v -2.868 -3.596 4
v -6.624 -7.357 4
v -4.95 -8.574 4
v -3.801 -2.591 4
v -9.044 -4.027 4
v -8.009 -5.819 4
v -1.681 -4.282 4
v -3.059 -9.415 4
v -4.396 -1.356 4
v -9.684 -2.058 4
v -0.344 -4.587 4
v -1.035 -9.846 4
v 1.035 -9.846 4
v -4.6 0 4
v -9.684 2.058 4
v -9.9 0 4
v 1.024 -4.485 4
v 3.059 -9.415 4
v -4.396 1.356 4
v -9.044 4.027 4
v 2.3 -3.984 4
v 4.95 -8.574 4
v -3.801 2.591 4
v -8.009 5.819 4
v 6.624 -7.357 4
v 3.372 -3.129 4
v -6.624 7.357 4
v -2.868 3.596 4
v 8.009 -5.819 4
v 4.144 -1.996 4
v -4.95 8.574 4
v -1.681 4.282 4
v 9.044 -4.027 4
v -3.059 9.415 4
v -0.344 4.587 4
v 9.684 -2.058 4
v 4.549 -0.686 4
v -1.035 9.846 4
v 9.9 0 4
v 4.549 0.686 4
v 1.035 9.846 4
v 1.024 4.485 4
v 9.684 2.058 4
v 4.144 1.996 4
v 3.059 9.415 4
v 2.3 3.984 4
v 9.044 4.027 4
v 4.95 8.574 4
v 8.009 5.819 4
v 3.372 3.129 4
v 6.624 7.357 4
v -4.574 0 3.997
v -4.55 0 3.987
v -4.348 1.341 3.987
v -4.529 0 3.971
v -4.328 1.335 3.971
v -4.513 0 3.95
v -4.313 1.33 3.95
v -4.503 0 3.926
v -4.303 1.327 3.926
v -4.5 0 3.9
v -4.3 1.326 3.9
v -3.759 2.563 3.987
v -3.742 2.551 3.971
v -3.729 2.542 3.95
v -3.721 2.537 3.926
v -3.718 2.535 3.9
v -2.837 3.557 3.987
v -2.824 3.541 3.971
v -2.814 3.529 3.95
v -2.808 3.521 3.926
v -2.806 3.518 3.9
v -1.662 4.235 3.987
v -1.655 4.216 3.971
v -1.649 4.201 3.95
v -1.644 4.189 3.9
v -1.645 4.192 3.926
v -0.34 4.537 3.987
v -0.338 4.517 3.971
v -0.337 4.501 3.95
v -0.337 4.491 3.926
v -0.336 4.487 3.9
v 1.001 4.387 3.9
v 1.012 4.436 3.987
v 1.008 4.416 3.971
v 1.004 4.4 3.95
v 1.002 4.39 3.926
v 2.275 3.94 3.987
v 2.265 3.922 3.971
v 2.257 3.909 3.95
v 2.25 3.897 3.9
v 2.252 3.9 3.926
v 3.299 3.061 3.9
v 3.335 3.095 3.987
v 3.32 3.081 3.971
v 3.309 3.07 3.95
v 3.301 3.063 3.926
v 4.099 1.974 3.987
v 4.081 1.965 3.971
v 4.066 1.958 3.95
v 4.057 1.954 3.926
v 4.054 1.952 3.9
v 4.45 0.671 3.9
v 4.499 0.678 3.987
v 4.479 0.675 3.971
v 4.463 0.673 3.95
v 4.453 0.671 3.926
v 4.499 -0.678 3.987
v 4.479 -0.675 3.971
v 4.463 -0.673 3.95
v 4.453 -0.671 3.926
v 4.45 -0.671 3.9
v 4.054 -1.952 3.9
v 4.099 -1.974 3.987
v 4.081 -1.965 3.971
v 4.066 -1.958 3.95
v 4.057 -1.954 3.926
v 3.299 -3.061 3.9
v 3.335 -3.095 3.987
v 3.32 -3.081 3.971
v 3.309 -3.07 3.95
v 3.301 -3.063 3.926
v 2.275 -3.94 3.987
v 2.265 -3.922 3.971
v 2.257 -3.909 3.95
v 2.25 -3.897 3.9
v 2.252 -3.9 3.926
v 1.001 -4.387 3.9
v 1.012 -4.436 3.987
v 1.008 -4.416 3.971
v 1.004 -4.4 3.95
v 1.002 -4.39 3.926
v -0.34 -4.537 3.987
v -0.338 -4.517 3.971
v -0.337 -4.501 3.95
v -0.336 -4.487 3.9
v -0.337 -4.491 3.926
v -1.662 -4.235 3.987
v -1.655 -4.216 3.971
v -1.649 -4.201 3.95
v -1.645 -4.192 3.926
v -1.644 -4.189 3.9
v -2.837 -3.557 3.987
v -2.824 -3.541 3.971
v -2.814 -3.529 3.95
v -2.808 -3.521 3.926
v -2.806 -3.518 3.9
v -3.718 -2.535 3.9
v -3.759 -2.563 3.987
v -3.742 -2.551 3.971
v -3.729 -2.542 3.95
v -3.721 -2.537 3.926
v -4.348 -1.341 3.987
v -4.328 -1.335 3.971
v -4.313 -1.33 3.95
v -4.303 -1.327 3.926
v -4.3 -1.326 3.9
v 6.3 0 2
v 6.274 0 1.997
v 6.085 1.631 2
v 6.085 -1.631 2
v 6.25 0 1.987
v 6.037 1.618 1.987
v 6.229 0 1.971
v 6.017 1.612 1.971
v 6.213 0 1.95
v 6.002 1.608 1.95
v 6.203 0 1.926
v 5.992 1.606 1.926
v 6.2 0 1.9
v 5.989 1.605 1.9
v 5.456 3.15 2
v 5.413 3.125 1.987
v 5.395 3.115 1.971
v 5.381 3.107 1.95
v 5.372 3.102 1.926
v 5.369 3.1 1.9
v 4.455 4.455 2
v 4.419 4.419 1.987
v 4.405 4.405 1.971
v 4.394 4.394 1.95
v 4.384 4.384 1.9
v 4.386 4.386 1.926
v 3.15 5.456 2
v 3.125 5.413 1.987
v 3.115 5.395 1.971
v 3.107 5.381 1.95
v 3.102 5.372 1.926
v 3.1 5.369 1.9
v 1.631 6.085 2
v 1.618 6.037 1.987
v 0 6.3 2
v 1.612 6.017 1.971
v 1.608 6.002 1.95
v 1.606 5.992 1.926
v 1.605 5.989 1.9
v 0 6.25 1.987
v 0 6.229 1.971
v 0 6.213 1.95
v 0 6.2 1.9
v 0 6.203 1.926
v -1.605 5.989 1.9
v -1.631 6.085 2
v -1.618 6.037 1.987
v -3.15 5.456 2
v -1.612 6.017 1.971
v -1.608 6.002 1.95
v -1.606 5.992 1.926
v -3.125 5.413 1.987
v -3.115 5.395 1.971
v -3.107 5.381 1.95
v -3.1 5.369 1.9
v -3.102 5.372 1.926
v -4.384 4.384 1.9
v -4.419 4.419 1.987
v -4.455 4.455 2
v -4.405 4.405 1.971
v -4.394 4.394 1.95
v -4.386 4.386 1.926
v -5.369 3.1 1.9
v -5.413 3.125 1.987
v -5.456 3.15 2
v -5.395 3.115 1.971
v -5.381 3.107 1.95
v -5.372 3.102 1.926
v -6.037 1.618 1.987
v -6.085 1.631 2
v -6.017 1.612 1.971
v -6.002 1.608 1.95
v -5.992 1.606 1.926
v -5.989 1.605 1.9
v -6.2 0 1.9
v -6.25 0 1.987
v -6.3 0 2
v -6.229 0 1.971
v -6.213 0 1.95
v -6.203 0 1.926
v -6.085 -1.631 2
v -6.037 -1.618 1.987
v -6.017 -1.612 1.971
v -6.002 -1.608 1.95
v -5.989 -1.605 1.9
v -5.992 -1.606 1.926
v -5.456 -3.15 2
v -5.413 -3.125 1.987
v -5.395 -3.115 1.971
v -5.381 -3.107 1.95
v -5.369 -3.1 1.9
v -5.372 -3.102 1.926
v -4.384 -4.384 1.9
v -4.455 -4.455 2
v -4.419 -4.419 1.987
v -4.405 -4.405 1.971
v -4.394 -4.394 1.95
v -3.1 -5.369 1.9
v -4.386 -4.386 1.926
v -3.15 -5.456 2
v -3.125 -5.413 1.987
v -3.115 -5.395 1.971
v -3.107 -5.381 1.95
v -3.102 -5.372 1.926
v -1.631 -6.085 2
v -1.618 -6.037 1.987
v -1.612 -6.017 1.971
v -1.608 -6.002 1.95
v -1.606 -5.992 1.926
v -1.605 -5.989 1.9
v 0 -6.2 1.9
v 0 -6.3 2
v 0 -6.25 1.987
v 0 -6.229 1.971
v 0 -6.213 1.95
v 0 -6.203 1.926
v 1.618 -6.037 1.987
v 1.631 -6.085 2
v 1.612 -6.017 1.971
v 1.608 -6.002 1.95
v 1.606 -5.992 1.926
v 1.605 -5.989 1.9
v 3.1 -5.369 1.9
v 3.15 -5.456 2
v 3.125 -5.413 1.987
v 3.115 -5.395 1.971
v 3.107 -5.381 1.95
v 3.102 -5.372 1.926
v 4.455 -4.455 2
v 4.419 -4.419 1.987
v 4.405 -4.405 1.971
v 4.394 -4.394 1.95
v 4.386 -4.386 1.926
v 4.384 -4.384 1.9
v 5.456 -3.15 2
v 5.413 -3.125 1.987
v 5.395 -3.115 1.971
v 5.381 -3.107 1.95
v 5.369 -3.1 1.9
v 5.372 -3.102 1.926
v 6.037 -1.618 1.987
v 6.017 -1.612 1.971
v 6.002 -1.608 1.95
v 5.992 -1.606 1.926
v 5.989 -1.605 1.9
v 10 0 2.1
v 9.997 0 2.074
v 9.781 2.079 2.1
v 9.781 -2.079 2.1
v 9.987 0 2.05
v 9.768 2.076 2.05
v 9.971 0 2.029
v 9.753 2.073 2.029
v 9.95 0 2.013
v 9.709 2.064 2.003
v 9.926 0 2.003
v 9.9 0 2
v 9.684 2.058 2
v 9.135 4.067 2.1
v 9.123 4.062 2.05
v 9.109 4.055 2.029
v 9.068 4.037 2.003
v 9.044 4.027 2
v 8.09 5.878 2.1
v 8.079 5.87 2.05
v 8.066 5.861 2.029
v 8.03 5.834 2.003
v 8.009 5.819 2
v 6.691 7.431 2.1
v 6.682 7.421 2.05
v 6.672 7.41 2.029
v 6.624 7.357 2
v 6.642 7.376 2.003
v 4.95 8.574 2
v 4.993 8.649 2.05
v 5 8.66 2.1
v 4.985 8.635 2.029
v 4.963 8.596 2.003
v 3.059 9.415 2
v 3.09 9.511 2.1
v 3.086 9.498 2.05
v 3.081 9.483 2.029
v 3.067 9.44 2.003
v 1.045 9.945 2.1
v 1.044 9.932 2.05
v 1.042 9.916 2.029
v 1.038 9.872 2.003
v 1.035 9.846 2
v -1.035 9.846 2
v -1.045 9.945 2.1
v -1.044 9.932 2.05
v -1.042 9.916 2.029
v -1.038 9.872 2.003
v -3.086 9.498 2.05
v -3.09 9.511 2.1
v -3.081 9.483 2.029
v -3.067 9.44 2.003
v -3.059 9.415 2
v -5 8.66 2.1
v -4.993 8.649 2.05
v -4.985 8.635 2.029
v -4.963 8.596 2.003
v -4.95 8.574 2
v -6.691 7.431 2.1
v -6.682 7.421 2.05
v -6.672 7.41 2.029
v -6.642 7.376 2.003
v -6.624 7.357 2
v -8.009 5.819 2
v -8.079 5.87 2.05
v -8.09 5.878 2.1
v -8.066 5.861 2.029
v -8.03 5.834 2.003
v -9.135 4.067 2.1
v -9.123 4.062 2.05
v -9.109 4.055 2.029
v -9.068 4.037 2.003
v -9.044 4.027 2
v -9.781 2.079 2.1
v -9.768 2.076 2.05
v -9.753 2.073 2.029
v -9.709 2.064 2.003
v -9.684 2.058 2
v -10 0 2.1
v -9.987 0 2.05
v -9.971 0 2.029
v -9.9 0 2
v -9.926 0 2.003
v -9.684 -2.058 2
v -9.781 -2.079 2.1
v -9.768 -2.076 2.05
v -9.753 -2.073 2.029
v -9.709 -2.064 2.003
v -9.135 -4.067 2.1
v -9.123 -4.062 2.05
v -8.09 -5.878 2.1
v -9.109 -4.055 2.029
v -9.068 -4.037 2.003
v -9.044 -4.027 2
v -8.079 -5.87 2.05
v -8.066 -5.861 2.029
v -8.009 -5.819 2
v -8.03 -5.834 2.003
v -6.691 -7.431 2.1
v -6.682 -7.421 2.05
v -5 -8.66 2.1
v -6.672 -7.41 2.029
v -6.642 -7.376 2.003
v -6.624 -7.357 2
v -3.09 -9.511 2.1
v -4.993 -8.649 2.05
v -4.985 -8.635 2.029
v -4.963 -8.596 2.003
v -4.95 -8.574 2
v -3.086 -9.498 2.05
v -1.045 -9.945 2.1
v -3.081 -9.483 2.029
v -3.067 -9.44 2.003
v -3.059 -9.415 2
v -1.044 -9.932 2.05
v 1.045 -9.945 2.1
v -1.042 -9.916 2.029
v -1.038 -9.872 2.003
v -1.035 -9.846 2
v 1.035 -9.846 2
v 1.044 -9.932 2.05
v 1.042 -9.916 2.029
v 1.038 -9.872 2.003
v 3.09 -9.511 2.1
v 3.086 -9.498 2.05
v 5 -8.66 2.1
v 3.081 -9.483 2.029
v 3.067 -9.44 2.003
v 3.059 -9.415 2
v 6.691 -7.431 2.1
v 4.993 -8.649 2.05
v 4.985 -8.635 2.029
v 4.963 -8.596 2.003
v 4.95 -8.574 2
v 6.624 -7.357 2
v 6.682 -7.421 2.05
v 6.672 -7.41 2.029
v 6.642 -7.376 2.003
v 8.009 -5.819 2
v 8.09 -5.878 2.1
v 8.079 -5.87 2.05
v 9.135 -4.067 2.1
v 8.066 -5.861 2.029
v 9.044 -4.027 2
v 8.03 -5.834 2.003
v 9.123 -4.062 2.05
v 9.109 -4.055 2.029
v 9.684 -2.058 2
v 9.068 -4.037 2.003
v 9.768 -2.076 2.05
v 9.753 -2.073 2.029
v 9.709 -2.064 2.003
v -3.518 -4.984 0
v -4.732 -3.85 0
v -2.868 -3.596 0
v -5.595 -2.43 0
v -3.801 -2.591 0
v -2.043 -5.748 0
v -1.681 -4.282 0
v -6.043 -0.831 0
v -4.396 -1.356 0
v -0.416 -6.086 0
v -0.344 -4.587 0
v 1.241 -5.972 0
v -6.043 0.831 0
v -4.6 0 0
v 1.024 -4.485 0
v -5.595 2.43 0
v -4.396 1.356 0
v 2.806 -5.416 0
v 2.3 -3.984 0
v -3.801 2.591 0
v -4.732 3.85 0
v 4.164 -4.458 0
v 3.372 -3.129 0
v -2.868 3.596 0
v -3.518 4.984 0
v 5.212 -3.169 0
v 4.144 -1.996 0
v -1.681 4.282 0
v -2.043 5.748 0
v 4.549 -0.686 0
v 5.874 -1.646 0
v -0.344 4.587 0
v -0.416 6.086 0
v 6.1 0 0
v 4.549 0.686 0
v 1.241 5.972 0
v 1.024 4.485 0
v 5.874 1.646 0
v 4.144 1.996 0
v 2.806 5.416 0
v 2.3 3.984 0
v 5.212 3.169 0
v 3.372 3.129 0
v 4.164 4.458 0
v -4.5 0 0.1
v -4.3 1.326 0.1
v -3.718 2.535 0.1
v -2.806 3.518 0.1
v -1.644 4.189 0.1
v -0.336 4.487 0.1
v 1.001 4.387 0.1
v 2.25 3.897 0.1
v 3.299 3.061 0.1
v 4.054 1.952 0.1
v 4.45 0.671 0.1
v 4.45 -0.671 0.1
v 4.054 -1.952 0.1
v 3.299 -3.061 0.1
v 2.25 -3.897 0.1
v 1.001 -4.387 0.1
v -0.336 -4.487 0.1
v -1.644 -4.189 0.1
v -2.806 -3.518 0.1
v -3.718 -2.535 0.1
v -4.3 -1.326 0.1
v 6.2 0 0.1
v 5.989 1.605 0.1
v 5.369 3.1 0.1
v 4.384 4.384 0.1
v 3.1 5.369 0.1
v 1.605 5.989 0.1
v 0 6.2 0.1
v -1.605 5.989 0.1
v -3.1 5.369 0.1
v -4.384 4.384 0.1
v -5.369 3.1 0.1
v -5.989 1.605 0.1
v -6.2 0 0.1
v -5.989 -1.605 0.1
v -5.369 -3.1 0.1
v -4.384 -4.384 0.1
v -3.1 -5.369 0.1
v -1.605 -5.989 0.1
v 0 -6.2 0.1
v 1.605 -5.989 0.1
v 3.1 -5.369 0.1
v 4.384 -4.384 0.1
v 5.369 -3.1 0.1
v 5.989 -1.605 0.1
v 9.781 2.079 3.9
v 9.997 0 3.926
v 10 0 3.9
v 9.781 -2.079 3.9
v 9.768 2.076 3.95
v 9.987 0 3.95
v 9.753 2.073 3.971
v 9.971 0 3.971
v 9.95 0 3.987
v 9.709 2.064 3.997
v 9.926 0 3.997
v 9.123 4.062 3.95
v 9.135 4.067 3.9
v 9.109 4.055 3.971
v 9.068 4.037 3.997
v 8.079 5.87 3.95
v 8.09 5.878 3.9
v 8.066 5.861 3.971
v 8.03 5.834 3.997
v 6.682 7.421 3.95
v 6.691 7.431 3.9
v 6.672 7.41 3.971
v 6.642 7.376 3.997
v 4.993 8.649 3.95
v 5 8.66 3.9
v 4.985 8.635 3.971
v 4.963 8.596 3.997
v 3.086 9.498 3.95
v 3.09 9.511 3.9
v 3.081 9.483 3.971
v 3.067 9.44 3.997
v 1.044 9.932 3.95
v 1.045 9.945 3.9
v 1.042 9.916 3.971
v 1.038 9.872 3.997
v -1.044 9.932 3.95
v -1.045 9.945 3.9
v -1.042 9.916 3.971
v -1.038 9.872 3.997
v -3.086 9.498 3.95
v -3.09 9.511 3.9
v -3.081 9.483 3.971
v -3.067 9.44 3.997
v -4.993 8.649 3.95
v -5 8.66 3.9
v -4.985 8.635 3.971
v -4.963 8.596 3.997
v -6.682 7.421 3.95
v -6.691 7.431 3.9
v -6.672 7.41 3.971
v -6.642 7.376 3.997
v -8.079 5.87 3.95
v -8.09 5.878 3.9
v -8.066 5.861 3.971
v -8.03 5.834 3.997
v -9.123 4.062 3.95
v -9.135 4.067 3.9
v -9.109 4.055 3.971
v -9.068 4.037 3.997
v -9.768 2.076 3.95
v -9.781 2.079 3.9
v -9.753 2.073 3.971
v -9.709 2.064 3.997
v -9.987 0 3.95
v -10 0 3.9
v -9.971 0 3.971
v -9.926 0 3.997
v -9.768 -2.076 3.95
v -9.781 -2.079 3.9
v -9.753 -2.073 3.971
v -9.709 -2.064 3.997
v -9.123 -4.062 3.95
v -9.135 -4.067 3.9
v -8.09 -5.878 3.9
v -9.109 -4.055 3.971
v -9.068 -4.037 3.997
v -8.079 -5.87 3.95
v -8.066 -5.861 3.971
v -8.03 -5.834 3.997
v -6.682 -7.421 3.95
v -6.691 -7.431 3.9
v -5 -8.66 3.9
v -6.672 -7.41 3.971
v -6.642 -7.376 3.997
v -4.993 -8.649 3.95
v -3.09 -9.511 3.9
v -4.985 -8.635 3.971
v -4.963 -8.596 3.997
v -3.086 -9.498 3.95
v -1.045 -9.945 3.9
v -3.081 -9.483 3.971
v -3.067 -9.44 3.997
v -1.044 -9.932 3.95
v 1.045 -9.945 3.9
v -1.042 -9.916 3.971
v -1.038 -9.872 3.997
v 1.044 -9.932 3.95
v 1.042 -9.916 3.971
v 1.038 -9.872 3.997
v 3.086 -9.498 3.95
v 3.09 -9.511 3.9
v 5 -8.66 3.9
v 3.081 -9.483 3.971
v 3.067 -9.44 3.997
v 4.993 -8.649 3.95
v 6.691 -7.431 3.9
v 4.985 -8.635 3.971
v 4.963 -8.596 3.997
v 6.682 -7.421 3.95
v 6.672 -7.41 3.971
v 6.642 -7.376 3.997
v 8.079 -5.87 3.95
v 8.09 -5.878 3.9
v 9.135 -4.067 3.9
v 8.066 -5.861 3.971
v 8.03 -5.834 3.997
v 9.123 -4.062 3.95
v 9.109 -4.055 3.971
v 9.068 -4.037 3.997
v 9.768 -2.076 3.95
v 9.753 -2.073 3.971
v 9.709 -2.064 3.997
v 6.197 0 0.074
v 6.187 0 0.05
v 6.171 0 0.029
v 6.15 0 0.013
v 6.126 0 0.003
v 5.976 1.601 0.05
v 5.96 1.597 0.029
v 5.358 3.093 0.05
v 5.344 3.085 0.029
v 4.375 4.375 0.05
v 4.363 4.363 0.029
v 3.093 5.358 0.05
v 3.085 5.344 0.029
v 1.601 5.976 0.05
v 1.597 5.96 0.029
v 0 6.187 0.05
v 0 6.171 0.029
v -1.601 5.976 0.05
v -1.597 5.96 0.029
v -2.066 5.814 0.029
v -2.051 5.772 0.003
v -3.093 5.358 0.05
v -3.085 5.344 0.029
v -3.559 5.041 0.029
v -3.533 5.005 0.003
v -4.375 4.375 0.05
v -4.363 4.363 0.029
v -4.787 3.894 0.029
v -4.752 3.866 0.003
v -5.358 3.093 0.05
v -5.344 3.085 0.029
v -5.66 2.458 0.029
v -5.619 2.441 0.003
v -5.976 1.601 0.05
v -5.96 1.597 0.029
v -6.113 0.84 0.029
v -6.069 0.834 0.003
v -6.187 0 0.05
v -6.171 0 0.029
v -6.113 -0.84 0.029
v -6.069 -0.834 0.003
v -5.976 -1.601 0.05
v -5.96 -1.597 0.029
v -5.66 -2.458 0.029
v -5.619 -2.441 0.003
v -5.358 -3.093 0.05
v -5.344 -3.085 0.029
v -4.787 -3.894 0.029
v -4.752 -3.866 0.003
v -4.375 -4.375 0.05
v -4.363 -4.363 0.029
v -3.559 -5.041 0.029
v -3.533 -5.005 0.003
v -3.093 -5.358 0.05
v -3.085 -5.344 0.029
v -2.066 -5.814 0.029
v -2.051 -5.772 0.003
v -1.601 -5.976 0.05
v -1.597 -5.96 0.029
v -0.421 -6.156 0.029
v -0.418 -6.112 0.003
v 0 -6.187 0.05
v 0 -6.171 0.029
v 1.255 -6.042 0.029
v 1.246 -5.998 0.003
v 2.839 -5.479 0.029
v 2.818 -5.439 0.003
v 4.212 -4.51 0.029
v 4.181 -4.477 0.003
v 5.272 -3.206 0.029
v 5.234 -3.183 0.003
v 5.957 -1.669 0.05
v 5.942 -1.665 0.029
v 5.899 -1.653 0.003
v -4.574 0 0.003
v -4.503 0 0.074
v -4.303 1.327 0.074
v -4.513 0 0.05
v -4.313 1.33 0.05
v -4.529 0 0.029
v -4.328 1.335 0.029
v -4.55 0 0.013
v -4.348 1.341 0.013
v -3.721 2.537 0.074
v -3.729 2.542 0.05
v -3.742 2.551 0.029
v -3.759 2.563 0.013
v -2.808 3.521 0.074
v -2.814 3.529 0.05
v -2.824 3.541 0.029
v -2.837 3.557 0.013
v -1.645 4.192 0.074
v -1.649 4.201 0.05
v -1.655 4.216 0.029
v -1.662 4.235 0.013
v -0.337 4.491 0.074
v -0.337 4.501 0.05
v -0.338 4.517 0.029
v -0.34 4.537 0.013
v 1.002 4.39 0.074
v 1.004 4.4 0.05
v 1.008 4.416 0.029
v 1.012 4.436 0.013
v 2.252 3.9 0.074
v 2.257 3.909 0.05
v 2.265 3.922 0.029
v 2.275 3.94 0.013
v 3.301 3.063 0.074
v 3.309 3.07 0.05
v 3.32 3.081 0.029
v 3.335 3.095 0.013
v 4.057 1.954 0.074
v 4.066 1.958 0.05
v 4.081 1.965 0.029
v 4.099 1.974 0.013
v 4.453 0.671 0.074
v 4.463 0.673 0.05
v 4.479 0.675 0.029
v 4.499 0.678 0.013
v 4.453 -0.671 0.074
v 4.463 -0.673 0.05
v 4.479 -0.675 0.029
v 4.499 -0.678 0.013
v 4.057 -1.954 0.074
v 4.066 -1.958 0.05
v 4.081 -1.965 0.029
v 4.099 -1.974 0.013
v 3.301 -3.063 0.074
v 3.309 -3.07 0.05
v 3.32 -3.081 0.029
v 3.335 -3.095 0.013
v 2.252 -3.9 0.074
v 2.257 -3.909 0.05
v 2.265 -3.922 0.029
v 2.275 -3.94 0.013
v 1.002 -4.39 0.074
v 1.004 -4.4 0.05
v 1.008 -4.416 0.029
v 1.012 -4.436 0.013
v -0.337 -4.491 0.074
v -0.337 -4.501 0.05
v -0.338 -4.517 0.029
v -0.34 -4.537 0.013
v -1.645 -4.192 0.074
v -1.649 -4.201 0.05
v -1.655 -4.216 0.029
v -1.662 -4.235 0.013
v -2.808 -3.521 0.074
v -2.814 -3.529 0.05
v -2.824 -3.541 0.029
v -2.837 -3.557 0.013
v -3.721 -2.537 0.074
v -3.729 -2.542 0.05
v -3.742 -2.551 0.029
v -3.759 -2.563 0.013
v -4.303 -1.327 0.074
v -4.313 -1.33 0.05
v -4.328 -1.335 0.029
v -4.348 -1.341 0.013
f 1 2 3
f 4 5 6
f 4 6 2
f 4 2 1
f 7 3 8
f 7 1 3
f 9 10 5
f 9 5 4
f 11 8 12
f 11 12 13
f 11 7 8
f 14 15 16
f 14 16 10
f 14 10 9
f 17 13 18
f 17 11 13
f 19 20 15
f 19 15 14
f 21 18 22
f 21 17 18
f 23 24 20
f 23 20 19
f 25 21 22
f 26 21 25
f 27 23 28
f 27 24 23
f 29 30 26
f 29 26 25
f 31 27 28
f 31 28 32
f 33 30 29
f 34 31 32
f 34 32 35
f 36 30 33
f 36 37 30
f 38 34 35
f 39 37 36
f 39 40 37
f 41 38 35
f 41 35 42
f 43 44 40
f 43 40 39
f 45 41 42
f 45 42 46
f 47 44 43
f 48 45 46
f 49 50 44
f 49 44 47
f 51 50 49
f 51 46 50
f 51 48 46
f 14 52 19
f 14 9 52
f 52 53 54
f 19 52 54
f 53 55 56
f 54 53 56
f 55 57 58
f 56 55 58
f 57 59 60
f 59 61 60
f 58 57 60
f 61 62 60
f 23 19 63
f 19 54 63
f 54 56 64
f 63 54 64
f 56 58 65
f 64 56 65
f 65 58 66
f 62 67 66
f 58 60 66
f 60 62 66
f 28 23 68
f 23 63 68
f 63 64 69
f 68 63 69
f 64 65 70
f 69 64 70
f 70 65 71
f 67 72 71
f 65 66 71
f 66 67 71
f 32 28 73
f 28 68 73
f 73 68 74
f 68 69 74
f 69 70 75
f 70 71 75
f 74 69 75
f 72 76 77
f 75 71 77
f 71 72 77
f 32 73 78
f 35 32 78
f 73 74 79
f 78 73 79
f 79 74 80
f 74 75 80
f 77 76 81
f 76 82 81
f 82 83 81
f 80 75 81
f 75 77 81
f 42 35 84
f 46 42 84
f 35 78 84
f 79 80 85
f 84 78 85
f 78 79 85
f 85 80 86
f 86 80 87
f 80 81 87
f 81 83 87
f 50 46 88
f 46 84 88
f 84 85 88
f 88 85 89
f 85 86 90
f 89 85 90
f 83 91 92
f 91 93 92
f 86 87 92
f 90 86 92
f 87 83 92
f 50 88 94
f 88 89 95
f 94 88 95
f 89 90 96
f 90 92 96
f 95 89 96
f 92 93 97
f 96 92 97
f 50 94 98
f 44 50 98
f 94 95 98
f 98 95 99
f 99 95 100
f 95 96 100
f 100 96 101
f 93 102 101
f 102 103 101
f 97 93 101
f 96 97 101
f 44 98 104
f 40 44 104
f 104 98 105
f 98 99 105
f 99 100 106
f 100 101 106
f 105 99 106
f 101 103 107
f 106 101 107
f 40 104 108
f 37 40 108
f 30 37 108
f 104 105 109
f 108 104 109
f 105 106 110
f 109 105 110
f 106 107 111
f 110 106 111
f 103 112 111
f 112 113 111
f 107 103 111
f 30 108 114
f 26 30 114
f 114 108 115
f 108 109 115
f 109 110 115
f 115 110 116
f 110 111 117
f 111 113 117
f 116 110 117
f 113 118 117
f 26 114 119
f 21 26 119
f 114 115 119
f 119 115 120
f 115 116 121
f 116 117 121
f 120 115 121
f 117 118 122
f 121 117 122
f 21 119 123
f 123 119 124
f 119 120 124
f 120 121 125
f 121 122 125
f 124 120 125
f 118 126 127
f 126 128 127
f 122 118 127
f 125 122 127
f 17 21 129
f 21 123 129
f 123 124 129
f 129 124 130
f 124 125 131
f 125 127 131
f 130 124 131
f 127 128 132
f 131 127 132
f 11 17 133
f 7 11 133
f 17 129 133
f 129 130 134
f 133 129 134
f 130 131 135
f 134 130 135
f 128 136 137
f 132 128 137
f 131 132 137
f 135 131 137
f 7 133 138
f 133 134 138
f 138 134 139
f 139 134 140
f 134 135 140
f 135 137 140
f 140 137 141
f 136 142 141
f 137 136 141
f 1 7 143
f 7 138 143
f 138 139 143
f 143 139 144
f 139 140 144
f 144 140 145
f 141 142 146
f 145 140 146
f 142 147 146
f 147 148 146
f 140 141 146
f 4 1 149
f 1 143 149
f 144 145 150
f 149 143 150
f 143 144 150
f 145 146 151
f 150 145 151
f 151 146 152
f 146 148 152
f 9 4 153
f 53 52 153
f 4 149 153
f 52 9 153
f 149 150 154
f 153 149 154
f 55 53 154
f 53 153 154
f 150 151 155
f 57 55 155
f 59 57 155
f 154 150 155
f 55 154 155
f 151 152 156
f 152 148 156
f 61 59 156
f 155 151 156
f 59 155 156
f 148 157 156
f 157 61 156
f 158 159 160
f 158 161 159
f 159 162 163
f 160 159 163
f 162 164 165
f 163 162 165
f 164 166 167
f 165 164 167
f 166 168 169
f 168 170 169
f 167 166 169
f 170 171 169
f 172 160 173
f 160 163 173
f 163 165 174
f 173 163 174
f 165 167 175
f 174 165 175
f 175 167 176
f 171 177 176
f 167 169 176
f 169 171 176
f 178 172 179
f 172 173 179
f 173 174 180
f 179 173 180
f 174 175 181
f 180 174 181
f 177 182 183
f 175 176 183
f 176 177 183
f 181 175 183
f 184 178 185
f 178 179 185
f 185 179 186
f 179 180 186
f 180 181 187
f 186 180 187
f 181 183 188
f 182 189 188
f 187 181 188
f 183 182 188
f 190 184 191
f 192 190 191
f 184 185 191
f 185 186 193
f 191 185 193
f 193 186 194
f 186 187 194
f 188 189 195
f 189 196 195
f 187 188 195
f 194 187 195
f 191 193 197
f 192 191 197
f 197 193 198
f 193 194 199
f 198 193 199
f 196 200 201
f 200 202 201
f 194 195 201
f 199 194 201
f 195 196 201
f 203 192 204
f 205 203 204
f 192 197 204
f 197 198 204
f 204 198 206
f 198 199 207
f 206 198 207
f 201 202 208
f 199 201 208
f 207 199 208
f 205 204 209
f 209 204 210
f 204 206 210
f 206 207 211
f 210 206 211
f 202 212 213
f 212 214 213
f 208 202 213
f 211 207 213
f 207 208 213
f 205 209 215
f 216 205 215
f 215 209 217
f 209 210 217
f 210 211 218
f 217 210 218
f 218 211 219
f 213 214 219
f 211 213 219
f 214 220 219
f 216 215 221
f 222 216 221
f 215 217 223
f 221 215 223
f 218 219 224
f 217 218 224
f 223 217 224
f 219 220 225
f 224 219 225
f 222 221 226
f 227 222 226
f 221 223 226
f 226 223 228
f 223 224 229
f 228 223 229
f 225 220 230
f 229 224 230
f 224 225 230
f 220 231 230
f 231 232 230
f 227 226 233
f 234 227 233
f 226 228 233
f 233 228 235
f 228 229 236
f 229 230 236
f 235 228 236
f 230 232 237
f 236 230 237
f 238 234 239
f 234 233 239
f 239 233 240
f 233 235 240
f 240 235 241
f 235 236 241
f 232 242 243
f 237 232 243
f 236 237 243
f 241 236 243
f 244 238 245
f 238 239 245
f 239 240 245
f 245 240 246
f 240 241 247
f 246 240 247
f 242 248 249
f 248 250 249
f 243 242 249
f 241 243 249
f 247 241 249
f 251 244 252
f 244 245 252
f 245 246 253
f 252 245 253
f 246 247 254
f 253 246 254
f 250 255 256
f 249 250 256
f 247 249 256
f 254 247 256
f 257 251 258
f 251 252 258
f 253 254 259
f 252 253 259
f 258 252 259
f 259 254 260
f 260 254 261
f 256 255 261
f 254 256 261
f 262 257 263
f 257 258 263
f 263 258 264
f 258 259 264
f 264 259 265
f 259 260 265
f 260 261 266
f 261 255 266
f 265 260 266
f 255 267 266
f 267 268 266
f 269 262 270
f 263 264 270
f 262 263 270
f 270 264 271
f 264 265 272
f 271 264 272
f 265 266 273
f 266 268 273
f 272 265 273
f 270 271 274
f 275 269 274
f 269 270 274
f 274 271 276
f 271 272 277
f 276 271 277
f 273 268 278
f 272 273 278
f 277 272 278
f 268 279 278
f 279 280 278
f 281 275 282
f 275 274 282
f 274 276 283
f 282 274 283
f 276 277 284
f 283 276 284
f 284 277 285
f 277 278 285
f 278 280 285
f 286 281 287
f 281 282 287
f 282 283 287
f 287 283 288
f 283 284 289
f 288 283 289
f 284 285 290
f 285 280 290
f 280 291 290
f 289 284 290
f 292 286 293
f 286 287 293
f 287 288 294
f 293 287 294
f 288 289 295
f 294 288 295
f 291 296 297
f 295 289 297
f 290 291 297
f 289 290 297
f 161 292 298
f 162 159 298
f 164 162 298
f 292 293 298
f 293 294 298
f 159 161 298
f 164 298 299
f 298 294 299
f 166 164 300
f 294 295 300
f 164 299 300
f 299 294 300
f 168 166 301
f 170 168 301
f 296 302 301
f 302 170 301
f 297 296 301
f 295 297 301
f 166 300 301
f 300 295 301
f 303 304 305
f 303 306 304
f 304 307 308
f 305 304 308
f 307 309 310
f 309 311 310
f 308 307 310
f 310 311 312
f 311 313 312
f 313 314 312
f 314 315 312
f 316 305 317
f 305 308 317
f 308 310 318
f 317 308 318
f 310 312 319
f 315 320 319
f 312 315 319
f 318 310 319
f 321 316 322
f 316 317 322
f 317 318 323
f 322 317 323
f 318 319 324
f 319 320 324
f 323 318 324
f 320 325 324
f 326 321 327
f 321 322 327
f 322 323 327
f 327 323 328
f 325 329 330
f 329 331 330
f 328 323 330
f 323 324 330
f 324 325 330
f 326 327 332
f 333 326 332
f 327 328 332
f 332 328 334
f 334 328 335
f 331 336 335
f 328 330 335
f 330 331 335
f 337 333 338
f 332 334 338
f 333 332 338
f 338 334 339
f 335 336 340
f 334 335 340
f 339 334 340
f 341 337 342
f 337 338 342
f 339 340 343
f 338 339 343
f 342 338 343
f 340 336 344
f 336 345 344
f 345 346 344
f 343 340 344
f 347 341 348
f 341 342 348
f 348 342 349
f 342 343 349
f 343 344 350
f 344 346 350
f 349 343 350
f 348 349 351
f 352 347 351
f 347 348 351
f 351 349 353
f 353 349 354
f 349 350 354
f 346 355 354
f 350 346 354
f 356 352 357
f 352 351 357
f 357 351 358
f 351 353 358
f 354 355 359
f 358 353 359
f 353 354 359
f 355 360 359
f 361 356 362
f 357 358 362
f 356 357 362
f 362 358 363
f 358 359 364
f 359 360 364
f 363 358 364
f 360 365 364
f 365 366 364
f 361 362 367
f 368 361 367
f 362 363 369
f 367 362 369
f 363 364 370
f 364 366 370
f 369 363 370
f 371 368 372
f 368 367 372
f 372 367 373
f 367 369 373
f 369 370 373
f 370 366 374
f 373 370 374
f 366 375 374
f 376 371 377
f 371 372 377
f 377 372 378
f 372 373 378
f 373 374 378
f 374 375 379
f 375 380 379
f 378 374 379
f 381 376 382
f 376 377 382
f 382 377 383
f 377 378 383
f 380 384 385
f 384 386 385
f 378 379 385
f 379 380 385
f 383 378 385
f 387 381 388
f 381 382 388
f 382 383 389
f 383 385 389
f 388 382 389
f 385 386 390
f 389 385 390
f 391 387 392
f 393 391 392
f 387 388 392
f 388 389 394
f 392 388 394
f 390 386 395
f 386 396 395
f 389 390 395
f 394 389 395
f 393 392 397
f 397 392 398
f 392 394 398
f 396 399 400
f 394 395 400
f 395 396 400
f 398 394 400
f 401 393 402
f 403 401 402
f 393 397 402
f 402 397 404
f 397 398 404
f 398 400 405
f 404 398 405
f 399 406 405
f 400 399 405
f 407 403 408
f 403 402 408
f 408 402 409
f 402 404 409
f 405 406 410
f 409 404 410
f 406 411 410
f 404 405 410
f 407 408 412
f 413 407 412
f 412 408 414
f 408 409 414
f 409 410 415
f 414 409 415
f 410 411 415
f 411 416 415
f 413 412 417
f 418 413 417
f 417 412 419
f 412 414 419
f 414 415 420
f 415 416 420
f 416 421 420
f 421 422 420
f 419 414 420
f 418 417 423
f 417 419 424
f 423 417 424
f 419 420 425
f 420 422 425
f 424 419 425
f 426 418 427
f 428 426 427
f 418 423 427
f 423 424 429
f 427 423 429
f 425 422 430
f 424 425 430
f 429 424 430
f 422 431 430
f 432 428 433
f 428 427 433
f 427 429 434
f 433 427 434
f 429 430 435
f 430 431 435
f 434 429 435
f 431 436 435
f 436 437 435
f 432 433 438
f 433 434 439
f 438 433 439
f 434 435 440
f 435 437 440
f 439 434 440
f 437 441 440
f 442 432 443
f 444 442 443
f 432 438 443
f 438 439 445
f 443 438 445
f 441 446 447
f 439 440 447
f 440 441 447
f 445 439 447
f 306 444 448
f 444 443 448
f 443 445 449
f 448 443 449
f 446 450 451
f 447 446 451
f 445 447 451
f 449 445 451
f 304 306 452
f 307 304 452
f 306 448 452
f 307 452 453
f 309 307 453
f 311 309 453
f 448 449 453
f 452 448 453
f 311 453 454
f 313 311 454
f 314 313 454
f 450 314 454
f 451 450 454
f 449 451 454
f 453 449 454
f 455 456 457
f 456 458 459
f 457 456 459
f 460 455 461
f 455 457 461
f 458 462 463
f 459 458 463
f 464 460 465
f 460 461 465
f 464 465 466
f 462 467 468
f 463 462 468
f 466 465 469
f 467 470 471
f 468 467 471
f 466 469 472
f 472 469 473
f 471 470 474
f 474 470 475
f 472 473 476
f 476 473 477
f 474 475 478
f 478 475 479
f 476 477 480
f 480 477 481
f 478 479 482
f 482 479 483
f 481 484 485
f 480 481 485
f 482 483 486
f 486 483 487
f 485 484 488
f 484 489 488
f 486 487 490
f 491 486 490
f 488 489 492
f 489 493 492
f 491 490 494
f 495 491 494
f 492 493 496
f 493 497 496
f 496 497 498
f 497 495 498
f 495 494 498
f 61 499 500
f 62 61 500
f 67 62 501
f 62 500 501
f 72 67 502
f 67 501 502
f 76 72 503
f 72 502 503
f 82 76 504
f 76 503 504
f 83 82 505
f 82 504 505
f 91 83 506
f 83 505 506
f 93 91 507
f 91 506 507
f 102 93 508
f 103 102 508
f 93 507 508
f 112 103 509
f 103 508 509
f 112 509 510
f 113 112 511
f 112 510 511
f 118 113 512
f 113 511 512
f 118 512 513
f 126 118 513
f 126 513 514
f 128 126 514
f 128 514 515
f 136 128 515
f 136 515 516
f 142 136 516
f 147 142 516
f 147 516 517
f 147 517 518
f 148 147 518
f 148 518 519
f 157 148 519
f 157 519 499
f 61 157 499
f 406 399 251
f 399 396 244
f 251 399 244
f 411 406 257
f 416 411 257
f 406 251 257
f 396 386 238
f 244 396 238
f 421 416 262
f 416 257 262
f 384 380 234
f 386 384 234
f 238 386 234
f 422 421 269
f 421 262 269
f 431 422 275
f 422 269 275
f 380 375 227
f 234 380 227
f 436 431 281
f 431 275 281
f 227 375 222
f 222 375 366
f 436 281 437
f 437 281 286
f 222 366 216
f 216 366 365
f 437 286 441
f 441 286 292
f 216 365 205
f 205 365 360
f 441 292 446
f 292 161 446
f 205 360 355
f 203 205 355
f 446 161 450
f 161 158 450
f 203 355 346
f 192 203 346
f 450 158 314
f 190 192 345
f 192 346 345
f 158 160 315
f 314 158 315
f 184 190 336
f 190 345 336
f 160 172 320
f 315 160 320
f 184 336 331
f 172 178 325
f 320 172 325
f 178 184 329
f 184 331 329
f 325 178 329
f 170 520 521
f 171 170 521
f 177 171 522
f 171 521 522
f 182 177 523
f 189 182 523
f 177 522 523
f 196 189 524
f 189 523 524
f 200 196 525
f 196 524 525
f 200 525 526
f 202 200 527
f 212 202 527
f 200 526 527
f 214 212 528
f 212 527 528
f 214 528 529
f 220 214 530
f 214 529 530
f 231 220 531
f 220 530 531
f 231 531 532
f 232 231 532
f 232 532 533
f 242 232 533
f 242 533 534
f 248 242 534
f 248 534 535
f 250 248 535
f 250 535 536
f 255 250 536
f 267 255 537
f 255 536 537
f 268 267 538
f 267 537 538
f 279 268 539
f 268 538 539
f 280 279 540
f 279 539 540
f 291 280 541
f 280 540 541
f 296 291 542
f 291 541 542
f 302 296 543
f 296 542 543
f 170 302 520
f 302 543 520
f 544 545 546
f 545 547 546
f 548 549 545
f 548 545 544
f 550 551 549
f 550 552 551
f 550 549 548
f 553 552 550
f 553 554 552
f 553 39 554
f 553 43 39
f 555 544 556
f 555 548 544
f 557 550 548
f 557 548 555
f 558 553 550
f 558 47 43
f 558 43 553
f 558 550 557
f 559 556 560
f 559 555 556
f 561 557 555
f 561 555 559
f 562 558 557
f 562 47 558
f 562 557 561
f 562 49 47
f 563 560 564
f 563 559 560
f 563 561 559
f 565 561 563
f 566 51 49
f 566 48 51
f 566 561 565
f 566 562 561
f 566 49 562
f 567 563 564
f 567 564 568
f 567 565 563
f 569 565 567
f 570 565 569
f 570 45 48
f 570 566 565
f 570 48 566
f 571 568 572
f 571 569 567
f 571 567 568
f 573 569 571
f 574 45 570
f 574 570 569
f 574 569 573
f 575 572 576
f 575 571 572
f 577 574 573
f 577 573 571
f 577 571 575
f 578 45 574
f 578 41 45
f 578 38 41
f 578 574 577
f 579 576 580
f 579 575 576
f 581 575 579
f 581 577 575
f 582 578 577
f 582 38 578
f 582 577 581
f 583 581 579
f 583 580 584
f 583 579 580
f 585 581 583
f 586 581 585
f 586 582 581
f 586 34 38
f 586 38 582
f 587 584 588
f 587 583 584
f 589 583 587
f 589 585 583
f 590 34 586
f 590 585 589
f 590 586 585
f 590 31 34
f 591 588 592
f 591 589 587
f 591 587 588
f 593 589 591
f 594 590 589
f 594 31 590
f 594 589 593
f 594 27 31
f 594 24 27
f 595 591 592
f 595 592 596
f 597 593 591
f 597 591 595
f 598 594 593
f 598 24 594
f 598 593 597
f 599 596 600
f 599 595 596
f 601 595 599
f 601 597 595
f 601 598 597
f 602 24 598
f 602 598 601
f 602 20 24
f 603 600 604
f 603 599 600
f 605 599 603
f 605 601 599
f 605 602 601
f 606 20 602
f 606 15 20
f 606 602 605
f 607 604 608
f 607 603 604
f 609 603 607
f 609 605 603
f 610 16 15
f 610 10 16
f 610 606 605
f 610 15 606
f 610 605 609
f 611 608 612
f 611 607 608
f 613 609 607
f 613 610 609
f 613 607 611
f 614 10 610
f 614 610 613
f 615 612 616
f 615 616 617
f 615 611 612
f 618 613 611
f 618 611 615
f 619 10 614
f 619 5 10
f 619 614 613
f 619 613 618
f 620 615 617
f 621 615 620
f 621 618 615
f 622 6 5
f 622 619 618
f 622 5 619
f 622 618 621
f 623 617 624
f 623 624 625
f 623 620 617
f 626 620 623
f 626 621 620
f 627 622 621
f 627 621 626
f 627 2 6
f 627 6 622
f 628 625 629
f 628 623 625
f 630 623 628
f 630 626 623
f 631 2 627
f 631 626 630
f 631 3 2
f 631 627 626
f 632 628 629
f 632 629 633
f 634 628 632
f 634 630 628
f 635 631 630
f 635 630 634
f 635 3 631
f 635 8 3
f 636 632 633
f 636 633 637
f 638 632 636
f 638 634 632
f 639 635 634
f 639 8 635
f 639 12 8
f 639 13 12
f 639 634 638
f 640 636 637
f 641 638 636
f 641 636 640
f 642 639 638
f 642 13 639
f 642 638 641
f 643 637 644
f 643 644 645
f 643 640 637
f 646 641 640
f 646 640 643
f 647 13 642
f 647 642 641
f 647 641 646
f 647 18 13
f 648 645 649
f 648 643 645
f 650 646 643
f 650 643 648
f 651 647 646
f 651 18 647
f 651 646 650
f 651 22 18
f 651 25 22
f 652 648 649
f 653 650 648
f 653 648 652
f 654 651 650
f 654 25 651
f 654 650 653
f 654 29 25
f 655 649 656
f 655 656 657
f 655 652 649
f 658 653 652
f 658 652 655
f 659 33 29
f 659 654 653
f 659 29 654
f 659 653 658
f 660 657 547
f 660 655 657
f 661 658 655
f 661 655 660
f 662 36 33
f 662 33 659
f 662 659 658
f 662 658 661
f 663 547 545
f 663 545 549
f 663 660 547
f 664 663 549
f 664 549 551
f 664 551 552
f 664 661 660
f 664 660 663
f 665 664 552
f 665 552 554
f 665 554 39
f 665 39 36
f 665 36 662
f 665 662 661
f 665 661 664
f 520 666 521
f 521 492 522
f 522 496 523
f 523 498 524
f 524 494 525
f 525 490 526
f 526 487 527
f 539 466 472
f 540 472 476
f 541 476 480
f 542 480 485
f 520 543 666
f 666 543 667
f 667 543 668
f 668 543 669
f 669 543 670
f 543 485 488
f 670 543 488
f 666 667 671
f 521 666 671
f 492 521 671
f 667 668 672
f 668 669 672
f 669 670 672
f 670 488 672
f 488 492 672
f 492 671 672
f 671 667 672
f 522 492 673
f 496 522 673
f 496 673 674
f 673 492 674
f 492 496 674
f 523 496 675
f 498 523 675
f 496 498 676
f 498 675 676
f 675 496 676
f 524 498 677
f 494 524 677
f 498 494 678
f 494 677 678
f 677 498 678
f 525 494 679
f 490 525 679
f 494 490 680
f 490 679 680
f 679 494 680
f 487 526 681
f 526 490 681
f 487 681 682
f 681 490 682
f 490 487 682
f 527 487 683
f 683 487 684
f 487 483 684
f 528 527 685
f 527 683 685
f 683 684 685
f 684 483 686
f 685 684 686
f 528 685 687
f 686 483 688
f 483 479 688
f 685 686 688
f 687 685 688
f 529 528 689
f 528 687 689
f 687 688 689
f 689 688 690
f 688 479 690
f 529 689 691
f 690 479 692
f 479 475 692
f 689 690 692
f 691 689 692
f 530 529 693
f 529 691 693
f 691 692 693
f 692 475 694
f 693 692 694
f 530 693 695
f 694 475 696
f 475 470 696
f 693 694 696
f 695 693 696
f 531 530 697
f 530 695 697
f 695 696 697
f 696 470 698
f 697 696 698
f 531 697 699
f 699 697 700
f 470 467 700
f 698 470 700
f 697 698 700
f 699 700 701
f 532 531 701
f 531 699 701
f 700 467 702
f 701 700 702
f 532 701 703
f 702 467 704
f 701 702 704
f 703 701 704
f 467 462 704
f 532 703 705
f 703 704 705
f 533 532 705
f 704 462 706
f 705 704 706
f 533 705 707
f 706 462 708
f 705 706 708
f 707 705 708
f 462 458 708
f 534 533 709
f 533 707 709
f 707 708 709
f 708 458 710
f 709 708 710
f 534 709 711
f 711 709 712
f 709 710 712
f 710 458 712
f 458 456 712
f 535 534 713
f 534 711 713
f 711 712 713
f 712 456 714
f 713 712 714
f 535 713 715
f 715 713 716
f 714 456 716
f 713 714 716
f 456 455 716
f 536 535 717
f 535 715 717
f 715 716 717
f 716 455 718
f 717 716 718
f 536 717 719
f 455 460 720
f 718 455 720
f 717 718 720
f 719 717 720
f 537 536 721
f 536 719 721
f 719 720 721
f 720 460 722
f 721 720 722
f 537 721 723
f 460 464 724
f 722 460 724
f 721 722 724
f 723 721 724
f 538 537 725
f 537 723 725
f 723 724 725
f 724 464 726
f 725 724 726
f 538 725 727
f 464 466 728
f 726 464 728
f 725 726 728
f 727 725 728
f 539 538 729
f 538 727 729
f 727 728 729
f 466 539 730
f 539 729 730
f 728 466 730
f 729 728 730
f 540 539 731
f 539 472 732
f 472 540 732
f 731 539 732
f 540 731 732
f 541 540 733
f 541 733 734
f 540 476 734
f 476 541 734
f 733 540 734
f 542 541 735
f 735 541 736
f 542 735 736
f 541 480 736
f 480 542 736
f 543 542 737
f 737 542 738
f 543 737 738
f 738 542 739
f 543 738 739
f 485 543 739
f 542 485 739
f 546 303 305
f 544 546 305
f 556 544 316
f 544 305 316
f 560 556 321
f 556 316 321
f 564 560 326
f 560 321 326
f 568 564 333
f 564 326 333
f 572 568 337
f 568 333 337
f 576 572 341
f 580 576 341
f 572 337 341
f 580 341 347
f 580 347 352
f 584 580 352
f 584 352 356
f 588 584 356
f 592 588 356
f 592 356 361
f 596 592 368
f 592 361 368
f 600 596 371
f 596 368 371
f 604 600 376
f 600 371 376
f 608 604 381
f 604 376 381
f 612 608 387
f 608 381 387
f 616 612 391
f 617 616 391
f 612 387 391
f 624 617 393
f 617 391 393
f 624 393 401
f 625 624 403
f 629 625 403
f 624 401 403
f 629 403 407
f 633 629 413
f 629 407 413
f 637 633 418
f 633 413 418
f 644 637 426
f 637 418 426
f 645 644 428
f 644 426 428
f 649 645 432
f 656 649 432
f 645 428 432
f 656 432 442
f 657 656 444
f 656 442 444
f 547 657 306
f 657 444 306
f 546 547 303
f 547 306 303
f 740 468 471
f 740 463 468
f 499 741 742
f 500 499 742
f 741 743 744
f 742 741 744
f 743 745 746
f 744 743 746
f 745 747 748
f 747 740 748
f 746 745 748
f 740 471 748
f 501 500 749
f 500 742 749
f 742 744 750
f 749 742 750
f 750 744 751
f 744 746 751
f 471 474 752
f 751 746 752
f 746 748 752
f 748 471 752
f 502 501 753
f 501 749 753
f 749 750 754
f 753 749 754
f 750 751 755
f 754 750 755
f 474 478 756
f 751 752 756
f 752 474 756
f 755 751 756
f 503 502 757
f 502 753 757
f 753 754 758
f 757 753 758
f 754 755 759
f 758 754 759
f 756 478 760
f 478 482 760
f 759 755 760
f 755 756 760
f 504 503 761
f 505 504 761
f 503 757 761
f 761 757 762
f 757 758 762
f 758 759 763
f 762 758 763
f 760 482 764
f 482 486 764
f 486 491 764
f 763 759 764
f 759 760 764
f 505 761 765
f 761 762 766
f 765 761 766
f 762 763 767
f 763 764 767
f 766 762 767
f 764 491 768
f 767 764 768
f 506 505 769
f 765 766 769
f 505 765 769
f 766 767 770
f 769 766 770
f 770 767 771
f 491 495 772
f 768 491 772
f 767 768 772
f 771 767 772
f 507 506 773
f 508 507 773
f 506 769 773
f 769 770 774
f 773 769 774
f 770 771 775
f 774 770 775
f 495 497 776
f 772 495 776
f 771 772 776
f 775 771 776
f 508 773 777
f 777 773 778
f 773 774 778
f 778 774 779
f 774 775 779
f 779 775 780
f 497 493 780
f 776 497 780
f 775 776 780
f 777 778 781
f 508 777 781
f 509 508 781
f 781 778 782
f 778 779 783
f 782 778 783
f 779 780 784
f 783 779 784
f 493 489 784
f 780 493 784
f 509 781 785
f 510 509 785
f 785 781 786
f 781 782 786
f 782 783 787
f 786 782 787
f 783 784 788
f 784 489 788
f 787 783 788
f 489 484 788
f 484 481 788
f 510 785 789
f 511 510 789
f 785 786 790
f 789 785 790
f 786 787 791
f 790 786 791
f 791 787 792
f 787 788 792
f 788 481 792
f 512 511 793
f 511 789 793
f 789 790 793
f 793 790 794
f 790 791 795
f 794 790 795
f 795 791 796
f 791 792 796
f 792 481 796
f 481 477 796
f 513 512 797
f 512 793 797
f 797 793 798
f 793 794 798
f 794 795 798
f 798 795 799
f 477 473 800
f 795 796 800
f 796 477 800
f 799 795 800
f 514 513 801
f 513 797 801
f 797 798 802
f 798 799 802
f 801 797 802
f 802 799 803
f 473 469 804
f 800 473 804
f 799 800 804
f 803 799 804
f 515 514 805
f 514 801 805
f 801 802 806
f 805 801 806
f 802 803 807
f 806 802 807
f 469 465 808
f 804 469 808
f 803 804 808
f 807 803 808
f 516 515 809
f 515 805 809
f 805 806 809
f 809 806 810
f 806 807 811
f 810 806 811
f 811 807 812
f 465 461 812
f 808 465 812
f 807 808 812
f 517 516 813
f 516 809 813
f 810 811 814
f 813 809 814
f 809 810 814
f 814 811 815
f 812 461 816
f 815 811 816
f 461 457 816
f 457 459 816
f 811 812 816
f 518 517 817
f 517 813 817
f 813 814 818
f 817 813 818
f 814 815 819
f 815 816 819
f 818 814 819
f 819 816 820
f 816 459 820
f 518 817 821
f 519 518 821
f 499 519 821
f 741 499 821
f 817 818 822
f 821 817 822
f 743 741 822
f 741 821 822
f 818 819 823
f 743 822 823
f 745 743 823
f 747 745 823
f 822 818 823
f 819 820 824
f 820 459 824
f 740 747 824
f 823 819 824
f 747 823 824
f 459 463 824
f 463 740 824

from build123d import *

# Parameters (mm, degrees)
F0_R     = 6.2
F1_DEPTH = 2
F2_R     = 10
F2_R_2   = 6.2
F3_DEPTH = 2
F5_D     = 9
F6_R     = 0.1


with BuildPart() as f1:
    # F0 (on Top) → F1 (new body)
    with BuildSketch(Plane.XY):
        Circle(F0_R)
    extrude(amount=F1_DEPTH)

    # F2 (on face) → F3 (join)
    with BuildSketch(Plane.XY.offset(2)):
        Circle(F2_R)
        Circle(F2_R_2, mode=Mode.SUBTRACT)
        Circle(F2_R_2)
    extrude(amount=F3_DEPTH)

    # F5 (through all)
    with Locations(Plane.XY.offset(4)):
        with Locations((0, 0)):
            Hole(F5_D / 2)

    # F6
    f6_edges = [f1.edges().sort_by_distance(p)[0] for p in [
        (-10, 0, 4),
        (-10, 0, 2),
        (-6.2, 0, 0),
        (-6.2, 0, 2),
        (-4.5, 0, 4),
        (-4.5, 0, 0),
    ]]
    fillet(f6_edges, radius=F6_R)


solid = f1.part
